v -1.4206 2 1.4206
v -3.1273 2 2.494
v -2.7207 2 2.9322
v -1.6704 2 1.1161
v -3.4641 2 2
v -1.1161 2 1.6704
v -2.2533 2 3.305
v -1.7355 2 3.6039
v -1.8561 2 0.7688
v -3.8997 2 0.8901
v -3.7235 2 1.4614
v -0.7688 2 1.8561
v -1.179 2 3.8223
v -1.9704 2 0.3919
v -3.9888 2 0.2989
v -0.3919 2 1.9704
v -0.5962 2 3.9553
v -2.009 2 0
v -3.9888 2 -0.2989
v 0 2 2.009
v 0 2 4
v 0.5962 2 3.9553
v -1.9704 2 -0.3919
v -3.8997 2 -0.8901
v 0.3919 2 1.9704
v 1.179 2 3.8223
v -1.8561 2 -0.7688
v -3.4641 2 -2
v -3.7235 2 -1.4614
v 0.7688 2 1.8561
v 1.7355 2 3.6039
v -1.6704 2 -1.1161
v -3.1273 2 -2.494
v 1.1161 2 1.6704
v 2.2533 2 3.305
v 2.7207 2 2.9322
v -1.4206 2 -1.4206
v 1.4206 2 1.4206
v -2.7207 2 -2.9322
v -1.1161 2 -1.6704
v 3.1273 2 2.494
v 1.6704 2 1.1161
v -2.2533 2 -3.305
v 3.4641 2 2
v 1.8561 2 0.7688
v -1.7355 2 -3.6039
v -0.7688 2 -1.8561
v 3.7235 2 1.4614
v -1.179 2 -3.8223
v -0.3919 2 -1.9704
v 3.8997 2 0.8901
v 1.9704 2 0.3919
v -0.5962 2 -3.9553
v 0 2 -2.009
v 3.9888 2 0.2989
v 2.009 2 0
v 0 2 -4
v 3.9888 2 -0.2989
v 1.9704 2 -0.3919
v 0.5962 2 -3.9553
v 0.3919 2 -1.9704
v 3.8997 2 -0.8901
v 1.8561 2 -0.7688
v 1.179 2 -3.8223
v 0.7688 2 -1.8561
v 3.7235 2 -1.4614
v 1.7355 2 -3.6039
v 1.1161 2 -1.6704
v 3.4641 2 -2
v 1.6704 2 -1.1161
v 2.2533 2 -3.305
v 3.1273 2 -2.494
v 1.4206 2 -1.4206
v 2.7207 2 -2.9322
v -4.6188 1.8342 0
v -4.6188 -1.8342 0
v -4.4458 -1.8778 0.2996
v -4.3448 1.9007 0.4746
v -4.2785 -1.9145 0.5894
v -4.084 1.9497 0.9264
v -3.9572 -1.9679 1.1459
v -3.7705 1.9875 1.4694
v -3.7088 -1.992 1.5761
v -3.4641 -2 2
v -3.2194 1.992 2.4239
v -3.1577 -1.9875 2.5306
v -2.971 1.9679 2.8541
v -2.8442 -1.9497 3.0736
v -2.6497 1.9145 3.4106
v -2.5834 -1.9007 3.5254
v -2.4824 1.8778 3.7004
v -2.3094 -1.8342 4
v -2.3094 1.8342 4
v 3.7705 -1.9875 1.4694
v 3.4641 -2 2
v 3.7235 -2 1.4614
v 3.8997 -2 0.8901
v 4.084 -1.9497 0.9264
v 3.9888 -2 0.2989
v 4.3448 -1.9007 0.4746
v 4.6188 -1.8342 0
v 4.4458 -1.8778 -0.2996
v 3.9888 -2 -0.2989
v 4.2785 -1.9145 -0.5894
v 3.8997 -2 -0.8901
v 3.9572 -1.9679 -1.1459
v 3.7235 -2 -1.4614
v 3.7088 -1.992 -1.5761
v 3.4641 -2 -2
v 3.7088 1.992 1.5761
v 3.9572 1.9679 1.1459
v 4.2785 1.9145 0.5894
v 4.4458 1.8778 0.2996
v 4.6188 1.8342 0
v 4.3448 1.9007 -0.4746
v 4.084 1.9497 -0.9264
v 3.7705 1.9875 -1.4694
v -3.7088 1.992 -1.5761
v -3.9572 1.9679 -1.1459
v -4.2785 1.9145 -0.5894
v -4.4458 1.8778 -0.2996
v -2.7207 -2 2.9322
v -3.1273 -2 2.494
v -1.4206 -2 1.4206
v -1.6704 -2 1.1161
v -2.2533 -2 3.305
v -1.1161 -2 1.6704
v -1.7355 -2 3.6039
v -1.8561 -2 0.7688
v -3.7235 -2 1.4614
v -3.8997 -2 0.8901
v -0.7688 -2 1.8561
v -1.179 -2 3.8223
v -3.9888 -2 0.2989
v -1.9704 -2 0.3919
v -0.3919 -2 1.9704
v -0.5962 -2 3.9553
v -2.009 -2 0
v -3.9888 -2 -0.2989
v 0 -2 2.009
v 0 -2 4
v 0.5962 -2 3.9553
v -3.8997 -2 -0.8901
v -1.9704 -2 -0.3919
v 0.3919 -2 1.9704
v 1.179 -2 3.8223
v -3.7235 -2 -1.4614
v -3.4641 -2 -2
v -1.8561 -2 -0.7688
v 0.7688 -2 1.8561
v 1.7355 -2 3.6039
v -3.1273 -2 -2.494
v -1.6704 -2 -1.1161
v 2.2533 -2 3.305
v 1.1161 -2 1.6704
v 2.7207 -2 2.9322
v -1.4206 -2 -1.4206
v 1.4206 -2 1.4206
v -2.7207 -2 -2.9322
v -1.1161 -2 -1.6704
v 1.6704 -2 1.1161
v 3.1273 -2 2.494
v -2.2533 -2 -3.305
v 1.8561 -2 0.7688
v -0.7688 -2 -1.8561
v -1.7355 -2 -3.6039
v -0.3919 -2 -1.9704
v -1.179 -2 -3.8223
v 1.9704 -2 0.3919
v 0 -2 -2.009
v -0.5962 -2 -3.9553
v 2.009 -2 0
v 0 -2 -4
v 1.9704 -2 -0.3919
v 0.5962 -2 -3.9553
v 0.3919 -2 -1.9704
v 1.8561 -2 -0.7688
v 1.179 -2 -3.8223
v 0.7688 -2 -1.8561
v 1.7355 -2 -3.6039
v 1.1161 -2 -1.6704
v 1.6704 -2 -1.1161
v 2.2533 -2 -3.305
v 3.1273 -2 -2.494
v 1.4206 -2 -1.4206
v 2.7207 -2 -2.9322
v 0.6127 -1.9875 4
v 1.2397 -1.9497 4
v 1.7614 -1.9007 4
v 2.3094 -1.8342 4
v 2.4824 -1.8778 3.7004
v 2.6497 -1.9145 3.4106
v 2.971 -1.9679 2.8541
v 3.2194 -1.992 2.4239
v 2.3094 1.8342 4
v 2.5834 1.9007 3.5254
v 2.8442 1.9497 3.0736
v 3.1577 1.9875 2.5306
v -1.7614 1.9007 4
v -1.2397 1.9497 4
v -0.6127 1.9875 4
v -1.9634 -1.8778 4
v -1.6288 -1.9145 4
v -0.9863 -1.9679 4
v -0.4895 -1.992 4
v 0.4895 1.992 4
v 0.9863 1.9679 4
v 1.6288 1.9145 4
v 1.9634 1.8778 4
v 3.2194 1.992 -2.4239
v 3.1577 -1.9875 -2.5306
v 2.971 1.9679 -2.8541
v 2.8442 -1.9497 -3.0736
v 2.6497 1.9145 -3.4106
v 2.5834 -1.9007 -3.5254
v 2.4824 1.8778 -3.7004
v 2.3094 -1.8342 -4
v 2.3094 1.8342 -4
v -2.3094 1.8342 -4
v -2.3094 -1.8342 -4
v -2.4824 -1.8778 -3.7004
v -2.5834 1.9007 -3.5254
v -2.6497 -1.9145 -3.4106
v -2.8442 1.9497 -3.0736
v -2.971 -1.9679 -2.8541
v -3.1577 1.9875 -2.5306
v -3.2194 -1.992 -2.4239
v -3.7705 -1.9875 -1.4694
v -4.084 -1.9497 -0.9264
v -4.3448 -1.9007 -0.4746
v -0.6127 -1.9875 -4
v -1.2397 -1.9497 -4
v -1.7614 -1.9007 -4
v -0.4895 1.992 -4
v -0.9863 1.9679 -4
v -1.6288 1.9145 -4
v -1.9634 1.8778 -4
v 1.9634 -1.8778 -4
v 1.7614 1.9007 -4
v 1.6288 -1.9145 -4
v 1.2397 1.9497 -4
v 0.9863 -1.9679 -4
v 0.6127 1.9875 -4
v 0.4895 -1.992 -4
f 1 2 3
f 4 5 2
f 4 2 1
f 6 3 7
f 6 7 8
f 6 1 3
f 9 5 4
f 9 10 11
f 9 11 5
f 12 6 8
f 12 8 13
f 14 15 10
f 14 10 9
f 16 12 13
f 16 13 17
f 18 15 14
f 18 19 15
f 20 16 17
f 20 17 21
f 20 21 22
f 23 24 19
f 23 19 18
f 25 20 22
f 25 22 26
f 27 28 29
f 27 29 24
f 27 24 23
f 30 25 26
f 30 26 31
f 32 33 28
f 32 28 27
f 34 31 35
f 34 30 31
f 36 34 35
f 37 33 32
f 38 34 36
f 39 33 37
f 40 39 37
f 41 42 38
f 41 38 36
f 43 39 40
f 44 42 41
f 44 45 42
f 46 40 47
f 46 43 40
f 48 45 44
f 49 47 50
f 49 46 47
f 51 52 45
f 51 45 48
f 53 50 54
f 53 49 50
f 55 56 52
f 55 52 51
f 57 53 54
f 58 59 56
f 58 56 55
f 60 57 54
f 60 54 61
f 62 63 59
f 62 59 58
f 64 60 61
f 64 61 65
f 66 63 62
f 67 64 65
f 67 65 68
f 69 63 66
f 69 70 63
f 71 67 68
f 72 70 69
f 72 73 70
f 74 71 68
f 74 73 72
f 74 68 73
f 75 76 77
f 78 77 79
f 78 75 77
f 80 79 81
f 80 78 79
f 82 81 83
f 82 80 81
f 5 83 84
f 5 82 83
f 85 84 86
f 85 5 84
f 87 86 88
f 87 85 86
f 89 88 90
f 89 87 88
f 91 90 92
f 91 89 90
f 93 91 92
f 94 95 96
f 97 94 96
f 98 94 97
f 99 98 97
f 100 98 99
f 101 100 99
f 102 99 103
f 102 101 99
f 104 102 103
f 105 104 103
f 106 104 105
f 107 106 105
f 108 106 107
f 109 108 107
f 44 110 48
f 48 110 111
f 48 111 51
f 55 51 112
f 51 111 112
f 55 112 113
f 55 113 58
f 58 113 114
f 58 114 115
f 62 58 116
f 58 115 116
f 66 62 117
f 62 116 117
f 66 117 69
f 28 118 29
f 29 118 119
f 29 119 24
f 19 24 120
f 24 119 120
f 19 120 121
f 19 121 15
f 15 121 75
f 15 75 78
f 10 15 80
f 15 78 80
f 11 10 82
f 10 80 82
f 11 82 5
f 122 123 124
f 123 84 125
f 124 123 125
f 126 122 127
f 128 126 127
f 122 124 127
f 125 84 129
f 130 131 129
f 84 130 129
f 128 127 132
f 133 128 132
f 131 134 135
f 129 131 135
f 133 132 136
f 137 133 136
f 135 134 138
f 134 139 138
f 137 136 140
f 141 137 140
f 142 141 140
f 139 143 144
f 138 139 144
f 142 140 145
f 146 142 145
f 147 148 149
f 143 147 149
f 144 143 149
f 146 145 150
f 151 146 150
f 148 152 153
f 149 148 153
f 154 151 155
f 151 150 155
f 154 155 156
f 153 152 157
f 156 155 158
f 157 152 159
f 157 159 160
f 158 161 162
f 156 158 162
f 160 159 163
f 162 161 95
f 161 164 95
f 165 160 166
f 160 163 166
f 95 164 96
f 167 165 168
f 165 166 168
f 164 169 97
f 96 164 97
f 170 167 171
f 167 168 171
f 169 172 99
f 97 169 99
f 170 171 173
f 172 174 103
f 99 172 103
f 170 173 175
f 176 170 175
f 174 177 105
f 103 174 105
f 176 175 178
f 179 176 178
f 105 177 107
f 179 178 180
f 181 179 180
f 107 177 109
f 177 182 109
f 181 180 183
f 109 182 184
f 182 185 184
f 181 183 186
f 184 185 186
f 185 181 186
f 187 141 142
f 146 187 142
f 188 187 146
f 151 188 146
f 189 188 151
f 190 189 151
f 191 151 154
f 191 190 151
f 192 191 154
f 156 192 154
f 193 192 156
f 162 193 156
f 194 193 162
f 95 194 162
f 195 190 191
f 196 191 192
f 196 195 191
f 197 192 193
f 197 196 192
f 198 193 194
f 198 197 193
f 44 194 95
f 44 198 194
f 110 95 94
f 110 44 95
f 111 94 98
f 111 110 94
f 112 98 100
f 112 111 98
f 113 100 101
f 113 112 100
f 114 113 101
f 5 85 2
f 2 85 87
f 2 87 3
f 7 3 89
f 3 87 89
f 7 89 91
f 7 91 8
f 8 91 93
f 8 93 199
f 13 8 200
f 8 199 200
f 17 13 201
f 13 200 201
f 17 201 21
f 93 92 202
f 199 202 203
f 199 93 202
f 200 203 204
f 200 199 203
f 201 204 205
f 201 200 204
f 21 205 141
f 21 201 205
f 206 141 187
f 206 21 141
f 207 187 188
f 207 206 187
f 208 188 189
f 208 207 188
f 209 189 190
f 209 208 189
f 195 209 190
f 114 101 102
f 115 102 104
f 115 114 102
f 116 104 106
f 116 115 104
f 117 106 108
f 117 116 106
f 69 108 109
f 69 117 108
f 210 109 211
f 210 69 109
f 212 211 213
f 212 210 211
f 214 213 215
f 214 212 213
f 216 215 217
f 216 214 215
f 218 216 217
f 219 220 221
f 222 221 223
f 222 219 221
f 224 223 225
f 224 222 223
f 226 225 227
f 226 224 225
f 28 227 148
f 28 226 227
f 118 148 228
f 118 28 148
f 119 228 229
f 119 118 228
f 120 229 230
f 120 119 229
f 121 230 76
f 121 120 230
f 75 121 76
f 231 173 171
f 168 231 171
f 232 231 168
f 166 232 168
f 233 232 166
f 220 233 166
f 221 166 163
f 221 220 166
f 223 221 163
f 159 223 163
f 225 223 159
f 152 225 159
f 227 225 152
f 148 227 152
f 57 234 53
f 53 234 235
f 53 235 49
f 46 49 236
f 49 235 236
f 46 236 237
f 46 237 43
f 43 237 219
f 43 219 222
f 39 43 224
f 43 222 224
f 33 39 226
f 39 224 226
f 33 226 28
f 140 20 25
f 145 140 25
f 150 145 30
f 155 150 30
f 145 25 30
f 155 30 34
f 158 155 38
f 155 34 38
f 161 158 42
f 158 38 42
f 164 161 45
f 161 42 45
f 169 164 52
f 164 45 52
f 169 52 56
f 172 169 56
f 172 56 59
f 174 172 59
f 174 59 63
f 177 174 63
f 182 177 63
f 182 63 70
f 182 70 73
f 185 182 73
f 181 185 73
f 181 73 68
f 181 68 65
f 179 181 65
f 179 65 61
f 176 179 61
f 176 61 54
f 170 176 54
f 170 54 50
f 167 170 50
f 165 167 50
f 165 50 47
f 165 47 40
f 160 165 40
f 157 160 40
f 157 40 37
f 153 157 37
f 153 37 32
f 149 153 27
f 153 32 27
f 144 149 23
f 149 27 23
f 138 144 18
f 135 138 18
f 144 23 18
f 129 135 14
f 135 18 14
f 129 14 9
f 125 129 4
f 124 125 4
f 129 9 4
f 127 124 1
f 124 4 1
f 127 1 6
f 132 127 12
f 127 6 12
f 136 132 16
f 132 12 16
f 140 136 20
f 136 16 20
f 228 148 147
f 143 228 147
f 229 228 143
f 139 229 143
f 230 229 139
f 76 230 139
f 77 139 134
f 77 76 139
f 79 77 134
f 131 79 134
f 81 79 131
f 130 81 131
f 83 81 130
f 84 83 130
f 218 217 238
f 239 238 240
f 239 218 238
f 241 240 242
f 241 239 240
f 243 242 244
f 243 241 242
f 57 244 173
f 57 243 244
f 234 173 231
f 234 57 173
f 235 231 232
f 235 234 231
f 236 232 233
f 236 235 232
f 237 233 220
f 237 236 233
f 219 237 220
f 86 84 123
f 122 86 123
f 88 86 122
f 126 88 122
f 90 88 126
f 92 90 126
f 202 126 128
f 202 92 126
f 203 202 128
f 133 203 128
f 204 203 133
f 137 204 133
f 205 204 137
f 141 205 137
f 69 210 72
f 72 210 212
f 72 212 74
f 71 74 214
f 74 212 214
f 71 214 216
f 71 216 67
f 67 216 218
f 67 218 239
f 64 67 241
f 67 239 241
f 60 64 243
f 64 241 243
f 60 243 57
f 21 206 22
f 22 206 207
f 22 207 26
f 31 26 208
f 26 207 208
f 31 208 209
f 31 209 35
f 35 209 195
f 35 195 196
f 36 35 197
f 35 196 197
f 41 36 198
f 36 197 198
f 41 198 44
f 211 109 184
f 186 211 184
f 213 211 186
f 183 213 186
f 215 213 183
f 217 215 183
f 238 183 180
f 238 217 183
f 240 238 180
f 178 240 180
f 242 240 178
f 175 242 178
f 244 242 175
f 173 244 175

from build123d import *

# Parameters (mm, degrees)
EXTRUDE1_DEPTH = 2
SKETCH3_R      = 2.009
EXTRUDE2_DEPTH = 8.302967433


with BuildPart() as part:
    # Sketch1 → Extrude1 (new, symmetric)
    with BuildSketch(Plane(origin=(0, 0, 0), x_dir=(1, 0, 0), z_dir=(0, 1, 0))):
        Polygon((4.618802154, 0), (2.309401077, 4), (-2.309401077, 4), (-4.618802154, 0), (-2.309401077, -4), (2.309401077, -4), align=None)
    extrude(amount=EXTRUDE1_DEPTH, both=True)

    # Sketch2 → Cut-Revolve1 (revolve, cut)
    with BuildSketch(Plane(origin=(0, 0, 0), x_dir=(0, 0, -1), z_dir=(1, 0, 0))):
        Polygon((-4, 2), (-78.063973132, -17.845381789), (-78.063973132, 2), align=None)
    cut_revolve1 = revolve(axis=Axis((0, 0, 0), (0, 1, 0)), mode=Mode.SUBTRACT)

    # Mirror1: Cut-Revolve1 across plane
    add(cut_revolve1.mirror(Plane.ZX), mode=Mode.SUBTRACT)

    # Sketch3 → Extrude2 (cut, through all)
    with BuildSketch(Plane(origin=(0, 2, 0), x_dir=(1, 0, 0), z_dir=(0, 1, 0))):
        with Locations(Location((0, 0, 0), (0, 0, 270))):
            Circle(SKETCH3_R)
    extrude(amount=-EXTRUDE2_DEPTH, mode=Mode.SUBTRACT)


solid = part.part
